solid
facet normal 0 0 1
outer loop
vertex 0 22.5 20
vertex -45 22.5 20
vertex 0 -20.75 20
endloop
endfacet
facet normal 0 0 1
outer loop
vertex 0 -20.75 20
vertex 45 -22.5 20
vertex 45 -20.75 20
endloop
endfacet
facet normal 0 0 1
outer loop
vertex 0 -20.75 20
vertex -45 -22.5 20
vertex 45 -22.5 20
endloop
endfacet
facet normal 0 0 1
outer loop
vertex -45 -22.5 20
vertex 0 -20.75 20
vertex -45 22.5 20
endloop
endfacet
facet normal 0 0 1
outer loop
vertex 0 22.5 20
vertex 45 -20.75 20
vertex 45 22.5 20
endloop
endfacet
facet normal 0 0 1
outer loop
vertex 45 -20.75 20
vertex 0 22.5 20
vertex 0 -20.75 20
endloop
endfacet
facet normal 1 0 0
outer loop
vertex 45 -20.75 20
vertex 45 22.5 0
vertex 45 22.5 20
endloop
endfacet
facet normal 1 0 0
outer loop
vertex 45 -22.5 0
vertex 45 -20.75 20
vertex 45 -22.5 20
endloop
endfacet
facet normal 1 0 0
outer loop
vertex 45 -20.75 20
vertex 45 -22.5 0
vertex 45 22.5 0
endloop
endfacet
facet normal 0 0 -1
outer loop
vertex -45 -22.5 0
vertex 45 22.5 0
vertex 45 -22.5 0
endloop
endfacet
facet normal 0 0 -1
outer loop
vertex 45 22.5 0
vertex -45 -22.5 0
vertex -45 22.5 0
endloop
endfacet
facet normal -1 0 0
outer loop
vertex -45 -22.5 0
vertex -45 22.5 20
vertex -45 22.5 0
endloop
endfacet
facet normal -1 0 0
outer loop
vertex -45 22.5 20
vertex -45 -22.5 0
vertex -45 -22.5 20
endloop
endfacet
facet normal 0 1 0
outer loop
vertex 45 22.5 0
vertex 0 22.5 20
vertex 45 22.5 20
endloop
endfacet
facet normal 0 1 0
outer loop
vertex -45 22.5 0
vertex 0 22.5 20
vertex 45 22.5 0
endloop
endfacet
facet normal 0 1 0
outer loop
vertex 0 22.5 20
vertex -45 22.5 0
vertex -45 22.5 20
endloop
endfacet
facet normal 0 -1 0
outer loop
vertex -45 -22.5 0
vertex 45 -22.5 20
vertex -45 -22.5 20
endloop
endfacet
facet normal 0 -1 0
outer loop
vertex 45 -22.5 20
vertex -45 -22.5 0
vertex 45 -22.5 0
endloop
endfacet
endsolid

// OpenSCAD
// Drying rack for microscope slides - a solid base block with a row of parallel slots cut into
// the top face so slides stand upright on their long edge. NOVEL general part (not a part I have
// designed before).
//

slides_n   = 10;
slide_l    = 75;
slide_w    = 25;
slide_t    = 1;
base_l     = 90;
base_w     = 45;
base_h     = 20;
slot_l     = 77;
slot_w     = 1.6;
slot_d     = 10;
slot_gap   = 3.5;

$fn = 48;

slot_w_t = slot_w + 0.5;                 // cutting groove: wall + open space + wall

difference() {
    translate([-base_l / 2, -base_w / 2, 0]) cube([base_l, base_w, base_h]);
    for (i = [0 : slides_n - 1])
        translate([0, -base_w / 2 + slot_gap / 2 + i * slot_gap, base_h])
            cube([slot_l, base_w, slot_d]);                                    // through slot
    for (i = [0 : slides_n - 1])
        translate([0, -base_w / 2 + slot_gap / 2 + i * slot_gap, base_h])
            cube([slot_l, slot_w_t, slot_d]);                                   // wall below slot
}
